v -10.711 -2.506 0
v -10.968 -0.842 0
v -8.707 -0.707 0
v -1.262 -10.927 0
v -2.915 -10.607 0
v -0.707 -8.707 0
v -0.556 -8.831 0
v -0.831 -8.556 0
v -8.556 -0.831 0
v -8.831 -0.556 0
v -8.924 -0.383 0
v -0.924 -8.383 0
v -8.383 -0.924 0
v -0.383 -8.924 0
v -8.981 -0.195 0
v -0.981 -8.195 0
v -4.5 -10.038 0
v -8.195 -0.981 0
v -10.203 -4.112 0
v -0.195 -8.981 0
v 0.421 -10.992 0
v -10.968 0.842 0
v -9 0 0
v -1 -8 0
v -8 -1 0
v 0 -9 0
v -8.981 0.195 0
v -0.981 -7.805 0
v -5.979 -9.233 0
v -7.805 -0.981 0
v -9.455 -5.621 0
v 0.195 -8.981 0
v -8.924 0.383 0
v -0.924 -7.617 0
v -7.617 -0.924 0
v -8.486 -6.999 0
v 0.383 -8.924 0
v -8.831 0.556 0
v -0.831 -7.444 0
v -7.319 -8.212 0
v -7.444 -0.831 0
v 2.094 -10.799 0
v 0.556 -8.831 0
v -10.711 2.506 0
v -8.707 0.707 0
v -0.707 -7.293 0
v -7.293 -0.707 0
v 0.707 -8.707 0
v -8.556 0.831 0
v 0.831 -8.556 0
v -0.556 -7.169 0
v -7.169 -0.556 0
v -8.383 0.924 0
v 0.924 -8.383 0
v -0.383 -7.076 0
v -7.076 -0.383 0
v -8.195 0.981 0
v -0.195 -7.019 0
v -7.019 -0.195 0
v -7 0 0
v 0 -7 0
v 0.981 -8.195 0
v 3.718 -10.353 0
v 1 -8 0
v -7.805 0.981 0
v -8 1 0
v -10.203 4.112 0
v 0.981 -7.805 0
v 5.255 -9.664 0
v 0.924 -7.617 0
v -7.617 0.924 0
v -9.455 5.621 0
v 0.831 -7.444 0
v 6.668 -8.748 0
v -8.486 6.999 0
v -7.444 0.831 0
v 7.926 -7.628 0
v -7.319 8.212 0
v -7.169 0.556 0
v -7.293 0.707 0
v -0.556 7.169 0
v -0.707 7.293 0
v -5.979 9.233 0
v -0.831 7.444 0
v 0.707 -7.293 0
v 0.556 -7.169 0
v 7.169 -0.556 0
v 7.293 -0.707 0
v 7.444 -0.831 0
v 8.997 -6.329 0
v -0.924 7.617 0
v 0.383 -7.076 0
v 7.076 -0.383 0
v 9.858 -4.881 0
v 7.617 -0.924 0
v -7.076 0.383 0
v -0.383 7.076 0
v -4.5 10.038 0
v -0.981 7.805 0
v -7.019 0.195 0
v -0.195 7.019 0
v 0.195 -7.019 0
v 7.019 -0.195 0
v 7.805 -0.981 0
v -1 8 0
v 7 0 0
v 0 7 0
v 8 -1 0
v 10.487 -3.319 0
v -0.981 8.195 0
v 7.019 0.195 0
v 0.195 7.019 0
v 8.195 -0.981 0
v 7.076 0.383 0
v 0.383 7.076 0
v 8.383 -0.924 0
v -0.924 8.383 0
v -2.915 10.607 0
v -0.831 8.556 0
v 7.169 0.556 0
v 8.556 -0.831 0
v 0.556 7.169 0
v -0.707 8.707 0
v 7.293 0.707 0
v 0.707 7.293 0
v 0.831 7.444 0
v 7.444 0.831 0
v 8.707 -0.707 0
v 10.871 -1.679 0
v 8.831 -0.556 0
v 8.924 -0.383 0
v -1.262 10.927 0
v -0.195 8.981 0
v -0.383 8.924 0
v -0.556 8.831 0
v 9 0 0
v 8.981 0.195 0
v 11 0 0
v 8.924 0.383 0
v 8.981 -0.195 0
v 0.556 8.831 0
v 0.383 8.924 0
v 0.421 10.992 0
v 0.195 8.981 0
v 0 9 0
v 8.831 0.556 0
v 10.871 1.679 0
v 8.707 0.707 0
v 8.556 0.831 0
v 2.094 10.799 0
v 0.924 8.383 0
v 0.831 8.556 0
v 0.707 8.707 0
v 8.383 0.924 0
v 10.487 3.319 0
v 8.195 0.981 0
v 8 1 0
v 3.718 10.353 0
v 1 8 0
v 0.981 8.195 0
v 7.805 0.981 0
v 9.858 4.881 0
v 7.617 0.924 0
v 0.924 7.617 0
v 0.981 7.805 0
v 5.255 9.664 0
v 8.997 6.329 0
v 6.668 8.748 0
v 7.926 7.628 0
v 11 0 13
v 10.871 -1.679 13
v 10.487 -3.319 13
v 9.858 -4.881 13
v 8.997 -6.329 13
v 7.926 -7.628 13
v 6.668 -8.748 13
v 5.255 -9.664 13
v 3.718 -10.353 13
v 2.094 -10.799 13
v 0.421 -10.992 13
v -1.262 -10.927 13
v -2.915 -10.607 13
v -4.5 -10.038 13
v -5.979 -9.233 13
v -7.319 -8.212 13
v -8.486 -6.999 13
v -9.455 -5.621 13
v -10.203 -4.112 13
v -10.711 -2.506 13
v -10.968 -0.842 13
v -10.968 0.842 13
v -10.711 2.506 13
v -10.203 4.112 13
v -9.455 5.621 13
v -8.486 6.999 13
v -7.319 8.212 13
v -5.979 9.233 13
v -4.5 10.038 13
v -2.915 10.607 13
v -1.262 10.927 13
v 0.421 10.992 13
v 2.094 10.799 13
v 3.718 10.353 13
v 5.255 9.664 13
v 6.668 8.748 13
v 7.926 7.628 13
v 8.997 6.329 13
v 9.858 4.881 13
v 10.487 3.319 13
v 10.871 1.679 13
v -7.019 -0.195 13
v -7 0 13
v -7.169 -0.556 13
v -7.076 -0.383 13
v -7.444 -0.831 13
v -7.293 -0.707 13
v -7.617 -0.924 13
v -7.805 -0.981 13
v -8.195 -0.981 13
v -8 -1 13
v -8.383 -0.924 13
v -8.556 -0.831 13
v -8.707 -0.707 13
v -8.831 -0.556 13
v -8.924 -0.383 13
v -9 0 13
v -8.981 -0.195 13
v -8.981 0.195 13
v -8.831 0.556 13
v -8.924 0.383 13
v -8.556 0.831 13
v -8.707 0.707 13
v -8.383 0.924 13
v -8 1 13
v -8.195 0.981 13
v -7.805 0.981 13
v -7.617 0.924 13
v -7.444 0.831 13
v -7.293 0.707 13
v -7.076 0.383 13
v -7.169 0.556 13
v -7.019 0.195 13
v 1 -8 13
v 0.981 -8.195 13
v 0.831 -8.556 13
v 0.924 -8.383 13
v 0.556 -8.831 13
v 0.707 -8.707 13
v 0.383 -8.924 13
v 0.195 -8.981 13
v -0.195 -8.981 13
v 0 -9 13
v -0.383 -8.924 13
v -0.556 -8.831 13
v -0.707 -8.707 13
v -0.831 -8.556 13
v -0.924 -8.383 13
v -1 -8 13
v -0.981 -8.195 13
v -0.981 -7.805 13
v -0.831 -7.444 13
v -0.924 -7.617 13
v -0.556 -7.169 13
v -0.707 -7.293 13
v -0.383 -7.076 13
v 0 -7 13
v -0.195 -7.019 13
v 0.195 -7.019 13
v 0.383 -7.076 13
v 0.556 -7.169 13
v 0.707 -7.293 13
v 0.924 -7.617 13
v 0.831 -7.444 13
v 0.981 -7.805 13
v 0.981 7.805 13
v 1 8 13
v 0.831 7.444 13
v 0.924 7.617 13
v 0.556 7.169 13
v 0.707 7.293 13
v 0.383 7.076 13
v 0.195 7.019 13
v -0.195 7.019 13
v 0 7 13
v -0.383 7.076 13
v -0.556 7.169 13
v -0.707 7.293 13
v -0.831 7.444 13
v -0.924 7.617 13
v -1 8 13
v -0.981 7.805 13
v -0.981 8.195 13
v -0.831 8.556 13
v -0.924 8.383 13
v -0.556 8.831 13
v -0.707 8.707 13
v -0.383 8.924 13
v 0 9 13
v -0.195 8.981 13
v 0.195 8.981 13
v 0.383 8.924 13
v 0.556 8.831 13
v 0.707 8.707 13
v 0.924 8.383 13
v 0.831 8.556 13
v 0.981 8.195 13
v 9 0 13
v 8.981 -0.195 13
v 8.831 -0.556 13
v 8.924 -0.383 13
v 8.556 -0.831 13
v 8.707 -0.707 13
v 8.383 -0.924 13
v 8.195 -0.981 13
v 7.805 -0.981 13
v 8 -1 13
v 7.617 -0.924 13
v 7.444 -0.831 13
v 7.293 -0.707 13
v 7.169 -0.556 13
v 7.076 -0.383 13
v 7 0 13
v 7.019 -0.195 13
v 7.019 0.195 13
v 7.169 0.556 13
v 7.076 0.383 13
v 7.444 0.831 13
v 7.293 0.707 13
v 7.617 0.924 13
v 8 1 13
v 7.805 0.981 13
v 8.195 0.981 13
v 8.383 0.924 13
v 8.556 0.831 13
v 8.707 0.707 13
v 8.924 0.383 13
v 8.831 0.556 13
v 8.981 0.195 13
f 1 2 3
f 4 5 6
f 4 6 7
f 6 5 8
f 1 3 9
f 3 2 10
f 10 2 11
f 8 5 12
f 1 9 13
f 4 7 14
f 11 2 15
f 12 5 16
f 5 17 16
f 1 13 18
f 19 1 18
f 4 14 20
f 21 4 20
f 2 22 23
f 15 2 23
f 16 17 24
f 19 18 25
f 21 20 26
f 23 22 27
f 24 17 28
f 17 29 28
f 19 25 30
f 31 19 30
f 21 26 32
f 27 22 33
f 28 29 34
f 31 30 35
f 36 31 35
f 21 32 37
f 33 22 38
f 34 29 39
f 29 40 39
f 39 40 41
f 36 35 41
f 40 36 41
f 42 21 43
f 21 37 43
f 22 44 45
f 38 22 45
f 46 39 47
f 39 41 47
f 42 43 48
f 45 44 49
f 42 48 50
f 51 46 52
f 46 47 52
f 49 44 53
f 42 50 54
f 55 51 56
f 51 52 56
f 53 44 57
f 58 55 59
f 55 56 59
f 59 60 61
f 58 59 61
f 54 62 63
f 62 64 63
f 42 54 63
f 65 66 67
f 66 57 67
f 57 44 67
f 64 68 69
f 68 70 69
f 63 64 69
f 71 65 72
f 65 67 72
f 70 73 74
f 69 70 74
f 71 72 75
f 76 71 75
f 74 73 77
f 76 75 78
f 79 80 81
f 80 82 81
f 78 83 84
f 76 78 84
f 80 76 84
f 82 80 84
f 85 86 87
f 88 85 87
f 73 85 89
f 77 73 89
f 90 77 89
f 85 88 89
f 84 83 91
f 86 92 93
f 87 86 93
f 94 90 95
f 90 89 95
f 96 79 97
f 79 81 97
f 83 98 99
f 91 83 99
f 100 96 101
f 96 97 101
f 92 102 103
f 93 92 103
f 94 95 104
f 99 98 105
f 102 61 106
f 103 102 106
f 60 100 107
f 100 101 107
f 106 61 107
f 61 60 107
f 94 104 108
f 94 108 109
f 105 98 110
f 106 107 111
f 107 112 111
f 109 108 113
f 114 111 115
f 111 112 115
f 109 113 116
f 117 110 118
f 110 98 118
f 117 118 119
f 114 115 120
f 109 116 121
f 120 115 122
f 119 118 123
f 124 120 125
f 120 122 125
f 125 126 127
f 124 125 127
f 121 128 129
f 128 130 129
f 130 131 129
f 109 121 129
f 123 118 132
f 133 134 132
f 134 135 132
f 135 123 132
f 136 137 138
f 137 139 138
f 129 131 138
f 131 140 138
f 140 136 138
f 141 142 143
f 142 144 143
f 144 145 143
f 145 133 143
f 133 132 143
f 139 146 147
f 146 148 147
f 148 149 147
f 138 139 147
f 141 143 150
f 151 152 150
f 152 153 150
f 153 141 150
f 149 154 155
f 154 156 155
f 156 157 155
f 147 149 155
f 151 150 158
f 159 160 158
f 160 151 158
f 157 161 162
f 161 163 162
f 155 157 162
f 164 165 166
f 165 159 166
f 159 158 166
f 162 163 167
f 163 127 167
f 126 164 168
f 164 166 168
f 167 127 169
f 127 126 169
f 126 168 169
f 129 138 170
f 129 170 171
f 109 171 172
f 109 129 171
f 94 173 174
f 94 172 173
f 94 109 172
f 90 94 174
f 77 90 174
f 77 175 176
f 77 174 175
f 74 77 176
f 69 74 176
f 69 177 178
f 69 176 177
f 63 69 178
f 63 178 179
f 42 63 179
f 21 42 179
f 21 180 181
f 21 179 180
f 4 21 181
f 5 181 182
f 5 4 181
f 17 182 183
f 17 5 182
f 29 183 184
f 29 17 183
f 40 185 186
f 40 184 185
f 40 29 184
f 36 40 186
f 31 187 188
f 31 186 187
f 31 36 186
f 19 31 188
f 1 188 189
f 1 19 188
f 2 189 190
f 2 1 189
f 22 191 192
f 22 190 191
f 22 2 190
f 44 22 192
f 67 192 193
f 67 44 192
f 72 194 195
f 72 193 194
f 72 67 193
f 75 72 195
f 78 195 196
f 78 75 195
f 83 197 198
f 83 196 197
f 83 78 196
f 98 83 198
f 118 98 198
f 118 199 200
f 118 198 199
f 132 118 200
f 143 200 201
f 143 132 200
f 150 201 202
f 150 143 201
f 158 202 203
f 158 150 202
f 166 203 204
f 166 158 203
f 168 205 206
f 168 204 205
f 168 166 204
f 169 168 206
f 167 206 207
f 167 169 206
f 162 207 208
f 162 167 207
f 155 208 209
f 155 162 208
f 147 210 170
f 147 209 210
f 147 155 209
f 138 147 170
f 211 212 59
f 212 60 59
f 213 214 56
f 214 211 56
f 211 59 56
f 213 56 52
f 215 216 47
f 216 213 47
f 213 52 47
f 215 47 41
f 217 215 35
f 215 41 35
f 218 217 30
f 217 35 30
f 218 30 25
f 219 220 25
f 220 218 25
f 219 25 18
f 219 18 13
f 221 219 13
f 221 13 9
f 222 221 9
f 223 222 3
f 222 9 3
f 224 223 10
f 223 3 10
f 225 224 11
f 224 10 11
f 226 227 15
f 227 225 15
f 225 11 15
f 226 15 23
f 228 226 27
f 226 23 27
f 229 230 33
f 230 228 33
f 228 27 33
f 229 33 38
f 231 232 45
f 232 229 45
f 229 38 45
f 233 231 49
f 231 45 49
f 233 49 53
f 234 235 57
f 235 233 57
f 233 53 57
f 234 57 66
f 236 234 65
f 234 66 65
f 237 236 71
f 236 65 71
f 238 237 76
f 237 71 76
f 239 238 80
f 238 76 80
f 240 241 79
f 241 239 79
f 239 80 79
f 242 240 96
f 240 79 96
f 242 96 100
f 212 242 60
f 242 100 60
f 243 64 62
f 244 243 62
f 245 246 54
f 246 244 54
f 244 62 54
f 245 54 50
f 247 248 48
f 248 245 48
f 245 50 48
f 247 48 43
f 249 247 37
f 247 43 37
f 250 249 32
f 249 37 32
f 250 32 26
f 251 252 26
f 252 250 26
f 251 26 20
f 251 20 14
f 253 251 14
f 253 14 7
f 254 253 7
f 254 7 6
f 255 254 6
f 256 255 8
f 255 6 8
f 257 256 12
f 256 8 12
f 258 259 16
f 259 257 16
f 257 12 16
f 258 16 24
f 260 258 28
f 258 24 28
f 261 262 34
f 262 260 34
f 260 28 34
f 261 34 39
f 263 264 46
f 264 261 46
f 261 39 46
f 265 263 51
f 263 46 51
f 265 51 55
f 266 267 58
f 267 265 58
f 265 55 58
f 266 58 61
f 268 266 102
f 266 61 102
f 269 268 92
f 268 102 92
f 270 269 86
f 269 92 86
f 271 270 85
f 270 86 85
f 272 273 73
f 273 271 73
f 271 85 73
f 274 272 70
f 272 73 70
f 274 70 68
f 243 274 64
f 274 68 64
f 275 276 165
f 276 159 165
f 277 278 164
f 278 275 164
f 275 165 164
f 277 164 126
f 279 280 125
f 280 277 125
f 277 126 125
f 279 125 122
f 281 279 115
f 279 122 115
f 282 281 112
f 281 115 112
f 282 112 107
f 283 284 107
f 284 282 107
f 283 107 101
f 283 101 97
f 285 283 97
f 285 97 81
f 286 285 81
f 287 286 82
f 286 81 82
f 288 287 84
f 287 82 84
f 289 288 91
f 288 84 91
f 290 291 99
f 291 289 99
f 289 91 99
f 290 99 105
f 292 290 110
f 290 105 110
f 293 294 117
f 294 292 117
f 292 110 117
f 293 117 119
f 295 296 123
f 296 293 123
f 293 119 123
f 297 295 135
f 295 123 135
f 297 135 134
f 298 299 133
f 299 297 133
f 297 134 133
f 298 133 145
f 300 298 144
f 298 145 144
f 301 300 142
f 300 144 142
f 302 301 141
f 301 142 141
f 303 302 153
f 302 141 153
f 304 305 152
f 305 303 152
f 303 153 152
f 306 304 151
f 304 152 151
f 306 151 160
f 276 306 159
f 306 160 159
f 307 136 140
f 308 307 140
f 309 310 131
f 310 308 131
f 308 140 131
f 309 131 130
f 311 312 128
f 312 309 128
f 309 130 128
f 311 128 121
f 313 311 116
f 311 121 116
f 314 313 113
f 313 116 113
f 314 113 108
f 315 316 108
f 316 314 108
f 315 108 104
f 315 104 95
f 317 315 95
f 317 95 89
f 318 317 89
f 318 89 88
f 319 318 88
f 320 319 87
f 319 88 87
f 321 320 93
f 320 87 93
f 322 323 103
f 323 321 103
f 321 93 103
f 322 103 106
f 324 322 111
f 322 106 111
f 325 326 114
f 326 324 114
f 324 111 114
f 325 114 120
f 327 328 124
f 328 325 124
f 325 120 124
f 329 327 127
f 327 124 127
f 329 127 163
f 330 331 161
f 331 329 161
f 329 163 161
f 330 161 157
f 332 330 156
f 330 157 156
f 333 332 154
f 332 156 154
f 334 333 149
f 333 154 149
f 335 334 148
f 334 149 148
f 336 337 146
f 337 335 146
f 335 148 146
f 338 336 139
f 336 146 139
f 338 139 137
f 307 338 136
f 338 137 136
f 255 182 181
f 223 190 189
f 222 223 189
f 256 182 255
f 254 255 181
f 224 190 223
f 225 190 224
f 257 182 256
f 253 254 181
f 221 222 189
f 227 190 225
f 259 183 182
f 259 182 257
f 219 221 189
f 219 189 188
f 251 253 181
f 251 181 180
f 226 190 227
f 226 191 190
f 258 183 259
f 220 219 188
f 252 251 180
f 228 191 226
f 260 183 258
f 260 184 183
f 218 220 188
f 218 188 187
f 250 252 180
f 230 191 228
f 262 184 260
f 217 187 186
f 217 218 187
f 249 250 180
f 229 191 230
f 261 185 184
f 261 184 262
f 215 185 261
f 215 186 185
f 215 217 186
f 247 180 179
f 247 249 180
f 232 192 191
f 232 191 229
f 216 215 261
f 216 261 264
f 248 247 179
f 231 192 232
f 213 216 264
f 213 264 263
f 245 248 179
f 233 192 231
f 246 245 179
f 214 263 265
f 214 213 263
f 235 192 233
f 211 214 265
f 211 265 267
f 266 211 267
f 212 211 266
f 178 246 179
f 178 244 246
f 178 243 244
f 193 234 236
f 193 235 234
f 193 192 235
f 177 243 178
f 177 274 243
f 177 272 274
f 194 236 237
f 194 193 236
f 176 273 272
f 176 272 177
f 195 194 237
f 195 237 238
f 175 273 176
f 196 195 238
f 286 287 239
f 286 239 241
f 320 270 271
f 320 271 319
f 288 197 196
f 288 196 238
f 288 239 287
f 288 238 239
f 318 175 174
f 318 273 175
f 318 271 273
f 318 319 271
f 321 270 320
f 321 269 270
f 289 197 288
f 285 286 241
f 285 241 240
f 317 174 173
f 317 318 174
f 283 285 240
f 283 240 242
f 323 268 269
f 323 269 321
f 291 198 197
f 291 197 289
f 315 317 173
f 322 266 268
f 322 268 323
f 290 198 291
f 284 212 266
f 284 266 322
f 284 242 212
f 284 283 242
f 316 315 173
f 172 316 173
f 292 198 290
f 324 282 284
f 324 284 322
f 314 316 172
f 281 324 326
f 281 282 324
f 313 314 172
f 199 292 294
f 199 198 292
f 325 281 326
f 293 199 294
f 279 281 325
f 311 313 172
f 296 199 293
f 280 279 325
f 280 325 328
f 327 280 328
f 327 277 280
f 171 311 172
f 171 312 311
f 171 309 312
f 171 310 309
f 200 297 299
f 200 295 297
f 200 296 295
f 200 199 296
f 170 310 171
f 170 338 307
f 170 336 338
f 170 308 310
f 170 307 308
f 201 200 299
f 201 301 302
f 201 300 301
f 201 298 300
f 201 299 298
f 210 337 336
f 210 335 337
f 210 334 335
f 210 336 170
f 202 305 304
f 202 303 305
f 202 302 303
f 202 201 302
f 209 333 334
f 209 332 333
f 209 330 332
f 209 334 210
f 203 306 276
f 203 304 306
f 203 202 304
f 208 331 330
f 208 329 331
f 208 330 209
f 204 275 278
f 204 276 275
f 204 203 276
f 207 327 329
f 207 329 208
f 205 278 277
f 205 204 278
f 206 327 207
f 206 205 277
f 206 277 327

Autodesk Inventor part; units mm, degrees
ref_plane "YZ Plane" through (0, 0, 0) normal (1, 0, 0) x (0, 1, 0)
ref_plane "XZ Plane" through (0, 0, 0) normal (0, 1, 0) x (-1, 0, 0)
ref_plane "XY Plane" through (0, 0, 0) normal (0, 0, 1) x (1, 0, 0)
sketch "Sketch1" plane through (0, 0, 0) normal (0, 0, 1) x (1, 0, 0)
  circle A0 centre (0, 0) radius 11
  dimension "d0" = 22
extrude "Extrusion1" add sketch "Sketch1" along normal blind 10
sketch "Sketch2" plane through (0, 0, 10) normal (0, 0, 1) x (1, 0, 0)
  circle A0 centre (0, 0) radius 11 projected
  circle A1 centre (0, 0) radius 8
  circle A2 centre (-8, 0) radius 1
  circle A3 centre (0, 8) radius 1
  circle A4 centre (8, 0) radius 1
  circle A5 centre (0, -8) radius 1
  dimension "d3" = 16
  dimension "d4" = 2
  dimension "d5" = 2
  dimension "d6" = 2
  dimension "d7" = 2
extrude "Extrusion2" cut sketch "Sketch2" against normal blind 10 contours A1 A4 | A1 A4 | A3 A1 | A1 A3 | A5 A1 | A1 A5 | A2 A1 | A1 A2
sketch "Sketch3" plane through (0, 0, 10) normal (0, 0, 1) x (1, 0, 0)
  circle A0 centre (8, 0) radius 1 projected
  circle A1 centre (0, -8) radius 1 projected
  circle A2 centre (-8, 0) radius 1 projected
  circle A3 centre (0, 8) radius 1 projected
  circle A4 centre (0, 0) radius 11 projected
extrude "Extrusion3" add sketch "Sketch3" along normal blind 3
properties part number "awesomespin"
